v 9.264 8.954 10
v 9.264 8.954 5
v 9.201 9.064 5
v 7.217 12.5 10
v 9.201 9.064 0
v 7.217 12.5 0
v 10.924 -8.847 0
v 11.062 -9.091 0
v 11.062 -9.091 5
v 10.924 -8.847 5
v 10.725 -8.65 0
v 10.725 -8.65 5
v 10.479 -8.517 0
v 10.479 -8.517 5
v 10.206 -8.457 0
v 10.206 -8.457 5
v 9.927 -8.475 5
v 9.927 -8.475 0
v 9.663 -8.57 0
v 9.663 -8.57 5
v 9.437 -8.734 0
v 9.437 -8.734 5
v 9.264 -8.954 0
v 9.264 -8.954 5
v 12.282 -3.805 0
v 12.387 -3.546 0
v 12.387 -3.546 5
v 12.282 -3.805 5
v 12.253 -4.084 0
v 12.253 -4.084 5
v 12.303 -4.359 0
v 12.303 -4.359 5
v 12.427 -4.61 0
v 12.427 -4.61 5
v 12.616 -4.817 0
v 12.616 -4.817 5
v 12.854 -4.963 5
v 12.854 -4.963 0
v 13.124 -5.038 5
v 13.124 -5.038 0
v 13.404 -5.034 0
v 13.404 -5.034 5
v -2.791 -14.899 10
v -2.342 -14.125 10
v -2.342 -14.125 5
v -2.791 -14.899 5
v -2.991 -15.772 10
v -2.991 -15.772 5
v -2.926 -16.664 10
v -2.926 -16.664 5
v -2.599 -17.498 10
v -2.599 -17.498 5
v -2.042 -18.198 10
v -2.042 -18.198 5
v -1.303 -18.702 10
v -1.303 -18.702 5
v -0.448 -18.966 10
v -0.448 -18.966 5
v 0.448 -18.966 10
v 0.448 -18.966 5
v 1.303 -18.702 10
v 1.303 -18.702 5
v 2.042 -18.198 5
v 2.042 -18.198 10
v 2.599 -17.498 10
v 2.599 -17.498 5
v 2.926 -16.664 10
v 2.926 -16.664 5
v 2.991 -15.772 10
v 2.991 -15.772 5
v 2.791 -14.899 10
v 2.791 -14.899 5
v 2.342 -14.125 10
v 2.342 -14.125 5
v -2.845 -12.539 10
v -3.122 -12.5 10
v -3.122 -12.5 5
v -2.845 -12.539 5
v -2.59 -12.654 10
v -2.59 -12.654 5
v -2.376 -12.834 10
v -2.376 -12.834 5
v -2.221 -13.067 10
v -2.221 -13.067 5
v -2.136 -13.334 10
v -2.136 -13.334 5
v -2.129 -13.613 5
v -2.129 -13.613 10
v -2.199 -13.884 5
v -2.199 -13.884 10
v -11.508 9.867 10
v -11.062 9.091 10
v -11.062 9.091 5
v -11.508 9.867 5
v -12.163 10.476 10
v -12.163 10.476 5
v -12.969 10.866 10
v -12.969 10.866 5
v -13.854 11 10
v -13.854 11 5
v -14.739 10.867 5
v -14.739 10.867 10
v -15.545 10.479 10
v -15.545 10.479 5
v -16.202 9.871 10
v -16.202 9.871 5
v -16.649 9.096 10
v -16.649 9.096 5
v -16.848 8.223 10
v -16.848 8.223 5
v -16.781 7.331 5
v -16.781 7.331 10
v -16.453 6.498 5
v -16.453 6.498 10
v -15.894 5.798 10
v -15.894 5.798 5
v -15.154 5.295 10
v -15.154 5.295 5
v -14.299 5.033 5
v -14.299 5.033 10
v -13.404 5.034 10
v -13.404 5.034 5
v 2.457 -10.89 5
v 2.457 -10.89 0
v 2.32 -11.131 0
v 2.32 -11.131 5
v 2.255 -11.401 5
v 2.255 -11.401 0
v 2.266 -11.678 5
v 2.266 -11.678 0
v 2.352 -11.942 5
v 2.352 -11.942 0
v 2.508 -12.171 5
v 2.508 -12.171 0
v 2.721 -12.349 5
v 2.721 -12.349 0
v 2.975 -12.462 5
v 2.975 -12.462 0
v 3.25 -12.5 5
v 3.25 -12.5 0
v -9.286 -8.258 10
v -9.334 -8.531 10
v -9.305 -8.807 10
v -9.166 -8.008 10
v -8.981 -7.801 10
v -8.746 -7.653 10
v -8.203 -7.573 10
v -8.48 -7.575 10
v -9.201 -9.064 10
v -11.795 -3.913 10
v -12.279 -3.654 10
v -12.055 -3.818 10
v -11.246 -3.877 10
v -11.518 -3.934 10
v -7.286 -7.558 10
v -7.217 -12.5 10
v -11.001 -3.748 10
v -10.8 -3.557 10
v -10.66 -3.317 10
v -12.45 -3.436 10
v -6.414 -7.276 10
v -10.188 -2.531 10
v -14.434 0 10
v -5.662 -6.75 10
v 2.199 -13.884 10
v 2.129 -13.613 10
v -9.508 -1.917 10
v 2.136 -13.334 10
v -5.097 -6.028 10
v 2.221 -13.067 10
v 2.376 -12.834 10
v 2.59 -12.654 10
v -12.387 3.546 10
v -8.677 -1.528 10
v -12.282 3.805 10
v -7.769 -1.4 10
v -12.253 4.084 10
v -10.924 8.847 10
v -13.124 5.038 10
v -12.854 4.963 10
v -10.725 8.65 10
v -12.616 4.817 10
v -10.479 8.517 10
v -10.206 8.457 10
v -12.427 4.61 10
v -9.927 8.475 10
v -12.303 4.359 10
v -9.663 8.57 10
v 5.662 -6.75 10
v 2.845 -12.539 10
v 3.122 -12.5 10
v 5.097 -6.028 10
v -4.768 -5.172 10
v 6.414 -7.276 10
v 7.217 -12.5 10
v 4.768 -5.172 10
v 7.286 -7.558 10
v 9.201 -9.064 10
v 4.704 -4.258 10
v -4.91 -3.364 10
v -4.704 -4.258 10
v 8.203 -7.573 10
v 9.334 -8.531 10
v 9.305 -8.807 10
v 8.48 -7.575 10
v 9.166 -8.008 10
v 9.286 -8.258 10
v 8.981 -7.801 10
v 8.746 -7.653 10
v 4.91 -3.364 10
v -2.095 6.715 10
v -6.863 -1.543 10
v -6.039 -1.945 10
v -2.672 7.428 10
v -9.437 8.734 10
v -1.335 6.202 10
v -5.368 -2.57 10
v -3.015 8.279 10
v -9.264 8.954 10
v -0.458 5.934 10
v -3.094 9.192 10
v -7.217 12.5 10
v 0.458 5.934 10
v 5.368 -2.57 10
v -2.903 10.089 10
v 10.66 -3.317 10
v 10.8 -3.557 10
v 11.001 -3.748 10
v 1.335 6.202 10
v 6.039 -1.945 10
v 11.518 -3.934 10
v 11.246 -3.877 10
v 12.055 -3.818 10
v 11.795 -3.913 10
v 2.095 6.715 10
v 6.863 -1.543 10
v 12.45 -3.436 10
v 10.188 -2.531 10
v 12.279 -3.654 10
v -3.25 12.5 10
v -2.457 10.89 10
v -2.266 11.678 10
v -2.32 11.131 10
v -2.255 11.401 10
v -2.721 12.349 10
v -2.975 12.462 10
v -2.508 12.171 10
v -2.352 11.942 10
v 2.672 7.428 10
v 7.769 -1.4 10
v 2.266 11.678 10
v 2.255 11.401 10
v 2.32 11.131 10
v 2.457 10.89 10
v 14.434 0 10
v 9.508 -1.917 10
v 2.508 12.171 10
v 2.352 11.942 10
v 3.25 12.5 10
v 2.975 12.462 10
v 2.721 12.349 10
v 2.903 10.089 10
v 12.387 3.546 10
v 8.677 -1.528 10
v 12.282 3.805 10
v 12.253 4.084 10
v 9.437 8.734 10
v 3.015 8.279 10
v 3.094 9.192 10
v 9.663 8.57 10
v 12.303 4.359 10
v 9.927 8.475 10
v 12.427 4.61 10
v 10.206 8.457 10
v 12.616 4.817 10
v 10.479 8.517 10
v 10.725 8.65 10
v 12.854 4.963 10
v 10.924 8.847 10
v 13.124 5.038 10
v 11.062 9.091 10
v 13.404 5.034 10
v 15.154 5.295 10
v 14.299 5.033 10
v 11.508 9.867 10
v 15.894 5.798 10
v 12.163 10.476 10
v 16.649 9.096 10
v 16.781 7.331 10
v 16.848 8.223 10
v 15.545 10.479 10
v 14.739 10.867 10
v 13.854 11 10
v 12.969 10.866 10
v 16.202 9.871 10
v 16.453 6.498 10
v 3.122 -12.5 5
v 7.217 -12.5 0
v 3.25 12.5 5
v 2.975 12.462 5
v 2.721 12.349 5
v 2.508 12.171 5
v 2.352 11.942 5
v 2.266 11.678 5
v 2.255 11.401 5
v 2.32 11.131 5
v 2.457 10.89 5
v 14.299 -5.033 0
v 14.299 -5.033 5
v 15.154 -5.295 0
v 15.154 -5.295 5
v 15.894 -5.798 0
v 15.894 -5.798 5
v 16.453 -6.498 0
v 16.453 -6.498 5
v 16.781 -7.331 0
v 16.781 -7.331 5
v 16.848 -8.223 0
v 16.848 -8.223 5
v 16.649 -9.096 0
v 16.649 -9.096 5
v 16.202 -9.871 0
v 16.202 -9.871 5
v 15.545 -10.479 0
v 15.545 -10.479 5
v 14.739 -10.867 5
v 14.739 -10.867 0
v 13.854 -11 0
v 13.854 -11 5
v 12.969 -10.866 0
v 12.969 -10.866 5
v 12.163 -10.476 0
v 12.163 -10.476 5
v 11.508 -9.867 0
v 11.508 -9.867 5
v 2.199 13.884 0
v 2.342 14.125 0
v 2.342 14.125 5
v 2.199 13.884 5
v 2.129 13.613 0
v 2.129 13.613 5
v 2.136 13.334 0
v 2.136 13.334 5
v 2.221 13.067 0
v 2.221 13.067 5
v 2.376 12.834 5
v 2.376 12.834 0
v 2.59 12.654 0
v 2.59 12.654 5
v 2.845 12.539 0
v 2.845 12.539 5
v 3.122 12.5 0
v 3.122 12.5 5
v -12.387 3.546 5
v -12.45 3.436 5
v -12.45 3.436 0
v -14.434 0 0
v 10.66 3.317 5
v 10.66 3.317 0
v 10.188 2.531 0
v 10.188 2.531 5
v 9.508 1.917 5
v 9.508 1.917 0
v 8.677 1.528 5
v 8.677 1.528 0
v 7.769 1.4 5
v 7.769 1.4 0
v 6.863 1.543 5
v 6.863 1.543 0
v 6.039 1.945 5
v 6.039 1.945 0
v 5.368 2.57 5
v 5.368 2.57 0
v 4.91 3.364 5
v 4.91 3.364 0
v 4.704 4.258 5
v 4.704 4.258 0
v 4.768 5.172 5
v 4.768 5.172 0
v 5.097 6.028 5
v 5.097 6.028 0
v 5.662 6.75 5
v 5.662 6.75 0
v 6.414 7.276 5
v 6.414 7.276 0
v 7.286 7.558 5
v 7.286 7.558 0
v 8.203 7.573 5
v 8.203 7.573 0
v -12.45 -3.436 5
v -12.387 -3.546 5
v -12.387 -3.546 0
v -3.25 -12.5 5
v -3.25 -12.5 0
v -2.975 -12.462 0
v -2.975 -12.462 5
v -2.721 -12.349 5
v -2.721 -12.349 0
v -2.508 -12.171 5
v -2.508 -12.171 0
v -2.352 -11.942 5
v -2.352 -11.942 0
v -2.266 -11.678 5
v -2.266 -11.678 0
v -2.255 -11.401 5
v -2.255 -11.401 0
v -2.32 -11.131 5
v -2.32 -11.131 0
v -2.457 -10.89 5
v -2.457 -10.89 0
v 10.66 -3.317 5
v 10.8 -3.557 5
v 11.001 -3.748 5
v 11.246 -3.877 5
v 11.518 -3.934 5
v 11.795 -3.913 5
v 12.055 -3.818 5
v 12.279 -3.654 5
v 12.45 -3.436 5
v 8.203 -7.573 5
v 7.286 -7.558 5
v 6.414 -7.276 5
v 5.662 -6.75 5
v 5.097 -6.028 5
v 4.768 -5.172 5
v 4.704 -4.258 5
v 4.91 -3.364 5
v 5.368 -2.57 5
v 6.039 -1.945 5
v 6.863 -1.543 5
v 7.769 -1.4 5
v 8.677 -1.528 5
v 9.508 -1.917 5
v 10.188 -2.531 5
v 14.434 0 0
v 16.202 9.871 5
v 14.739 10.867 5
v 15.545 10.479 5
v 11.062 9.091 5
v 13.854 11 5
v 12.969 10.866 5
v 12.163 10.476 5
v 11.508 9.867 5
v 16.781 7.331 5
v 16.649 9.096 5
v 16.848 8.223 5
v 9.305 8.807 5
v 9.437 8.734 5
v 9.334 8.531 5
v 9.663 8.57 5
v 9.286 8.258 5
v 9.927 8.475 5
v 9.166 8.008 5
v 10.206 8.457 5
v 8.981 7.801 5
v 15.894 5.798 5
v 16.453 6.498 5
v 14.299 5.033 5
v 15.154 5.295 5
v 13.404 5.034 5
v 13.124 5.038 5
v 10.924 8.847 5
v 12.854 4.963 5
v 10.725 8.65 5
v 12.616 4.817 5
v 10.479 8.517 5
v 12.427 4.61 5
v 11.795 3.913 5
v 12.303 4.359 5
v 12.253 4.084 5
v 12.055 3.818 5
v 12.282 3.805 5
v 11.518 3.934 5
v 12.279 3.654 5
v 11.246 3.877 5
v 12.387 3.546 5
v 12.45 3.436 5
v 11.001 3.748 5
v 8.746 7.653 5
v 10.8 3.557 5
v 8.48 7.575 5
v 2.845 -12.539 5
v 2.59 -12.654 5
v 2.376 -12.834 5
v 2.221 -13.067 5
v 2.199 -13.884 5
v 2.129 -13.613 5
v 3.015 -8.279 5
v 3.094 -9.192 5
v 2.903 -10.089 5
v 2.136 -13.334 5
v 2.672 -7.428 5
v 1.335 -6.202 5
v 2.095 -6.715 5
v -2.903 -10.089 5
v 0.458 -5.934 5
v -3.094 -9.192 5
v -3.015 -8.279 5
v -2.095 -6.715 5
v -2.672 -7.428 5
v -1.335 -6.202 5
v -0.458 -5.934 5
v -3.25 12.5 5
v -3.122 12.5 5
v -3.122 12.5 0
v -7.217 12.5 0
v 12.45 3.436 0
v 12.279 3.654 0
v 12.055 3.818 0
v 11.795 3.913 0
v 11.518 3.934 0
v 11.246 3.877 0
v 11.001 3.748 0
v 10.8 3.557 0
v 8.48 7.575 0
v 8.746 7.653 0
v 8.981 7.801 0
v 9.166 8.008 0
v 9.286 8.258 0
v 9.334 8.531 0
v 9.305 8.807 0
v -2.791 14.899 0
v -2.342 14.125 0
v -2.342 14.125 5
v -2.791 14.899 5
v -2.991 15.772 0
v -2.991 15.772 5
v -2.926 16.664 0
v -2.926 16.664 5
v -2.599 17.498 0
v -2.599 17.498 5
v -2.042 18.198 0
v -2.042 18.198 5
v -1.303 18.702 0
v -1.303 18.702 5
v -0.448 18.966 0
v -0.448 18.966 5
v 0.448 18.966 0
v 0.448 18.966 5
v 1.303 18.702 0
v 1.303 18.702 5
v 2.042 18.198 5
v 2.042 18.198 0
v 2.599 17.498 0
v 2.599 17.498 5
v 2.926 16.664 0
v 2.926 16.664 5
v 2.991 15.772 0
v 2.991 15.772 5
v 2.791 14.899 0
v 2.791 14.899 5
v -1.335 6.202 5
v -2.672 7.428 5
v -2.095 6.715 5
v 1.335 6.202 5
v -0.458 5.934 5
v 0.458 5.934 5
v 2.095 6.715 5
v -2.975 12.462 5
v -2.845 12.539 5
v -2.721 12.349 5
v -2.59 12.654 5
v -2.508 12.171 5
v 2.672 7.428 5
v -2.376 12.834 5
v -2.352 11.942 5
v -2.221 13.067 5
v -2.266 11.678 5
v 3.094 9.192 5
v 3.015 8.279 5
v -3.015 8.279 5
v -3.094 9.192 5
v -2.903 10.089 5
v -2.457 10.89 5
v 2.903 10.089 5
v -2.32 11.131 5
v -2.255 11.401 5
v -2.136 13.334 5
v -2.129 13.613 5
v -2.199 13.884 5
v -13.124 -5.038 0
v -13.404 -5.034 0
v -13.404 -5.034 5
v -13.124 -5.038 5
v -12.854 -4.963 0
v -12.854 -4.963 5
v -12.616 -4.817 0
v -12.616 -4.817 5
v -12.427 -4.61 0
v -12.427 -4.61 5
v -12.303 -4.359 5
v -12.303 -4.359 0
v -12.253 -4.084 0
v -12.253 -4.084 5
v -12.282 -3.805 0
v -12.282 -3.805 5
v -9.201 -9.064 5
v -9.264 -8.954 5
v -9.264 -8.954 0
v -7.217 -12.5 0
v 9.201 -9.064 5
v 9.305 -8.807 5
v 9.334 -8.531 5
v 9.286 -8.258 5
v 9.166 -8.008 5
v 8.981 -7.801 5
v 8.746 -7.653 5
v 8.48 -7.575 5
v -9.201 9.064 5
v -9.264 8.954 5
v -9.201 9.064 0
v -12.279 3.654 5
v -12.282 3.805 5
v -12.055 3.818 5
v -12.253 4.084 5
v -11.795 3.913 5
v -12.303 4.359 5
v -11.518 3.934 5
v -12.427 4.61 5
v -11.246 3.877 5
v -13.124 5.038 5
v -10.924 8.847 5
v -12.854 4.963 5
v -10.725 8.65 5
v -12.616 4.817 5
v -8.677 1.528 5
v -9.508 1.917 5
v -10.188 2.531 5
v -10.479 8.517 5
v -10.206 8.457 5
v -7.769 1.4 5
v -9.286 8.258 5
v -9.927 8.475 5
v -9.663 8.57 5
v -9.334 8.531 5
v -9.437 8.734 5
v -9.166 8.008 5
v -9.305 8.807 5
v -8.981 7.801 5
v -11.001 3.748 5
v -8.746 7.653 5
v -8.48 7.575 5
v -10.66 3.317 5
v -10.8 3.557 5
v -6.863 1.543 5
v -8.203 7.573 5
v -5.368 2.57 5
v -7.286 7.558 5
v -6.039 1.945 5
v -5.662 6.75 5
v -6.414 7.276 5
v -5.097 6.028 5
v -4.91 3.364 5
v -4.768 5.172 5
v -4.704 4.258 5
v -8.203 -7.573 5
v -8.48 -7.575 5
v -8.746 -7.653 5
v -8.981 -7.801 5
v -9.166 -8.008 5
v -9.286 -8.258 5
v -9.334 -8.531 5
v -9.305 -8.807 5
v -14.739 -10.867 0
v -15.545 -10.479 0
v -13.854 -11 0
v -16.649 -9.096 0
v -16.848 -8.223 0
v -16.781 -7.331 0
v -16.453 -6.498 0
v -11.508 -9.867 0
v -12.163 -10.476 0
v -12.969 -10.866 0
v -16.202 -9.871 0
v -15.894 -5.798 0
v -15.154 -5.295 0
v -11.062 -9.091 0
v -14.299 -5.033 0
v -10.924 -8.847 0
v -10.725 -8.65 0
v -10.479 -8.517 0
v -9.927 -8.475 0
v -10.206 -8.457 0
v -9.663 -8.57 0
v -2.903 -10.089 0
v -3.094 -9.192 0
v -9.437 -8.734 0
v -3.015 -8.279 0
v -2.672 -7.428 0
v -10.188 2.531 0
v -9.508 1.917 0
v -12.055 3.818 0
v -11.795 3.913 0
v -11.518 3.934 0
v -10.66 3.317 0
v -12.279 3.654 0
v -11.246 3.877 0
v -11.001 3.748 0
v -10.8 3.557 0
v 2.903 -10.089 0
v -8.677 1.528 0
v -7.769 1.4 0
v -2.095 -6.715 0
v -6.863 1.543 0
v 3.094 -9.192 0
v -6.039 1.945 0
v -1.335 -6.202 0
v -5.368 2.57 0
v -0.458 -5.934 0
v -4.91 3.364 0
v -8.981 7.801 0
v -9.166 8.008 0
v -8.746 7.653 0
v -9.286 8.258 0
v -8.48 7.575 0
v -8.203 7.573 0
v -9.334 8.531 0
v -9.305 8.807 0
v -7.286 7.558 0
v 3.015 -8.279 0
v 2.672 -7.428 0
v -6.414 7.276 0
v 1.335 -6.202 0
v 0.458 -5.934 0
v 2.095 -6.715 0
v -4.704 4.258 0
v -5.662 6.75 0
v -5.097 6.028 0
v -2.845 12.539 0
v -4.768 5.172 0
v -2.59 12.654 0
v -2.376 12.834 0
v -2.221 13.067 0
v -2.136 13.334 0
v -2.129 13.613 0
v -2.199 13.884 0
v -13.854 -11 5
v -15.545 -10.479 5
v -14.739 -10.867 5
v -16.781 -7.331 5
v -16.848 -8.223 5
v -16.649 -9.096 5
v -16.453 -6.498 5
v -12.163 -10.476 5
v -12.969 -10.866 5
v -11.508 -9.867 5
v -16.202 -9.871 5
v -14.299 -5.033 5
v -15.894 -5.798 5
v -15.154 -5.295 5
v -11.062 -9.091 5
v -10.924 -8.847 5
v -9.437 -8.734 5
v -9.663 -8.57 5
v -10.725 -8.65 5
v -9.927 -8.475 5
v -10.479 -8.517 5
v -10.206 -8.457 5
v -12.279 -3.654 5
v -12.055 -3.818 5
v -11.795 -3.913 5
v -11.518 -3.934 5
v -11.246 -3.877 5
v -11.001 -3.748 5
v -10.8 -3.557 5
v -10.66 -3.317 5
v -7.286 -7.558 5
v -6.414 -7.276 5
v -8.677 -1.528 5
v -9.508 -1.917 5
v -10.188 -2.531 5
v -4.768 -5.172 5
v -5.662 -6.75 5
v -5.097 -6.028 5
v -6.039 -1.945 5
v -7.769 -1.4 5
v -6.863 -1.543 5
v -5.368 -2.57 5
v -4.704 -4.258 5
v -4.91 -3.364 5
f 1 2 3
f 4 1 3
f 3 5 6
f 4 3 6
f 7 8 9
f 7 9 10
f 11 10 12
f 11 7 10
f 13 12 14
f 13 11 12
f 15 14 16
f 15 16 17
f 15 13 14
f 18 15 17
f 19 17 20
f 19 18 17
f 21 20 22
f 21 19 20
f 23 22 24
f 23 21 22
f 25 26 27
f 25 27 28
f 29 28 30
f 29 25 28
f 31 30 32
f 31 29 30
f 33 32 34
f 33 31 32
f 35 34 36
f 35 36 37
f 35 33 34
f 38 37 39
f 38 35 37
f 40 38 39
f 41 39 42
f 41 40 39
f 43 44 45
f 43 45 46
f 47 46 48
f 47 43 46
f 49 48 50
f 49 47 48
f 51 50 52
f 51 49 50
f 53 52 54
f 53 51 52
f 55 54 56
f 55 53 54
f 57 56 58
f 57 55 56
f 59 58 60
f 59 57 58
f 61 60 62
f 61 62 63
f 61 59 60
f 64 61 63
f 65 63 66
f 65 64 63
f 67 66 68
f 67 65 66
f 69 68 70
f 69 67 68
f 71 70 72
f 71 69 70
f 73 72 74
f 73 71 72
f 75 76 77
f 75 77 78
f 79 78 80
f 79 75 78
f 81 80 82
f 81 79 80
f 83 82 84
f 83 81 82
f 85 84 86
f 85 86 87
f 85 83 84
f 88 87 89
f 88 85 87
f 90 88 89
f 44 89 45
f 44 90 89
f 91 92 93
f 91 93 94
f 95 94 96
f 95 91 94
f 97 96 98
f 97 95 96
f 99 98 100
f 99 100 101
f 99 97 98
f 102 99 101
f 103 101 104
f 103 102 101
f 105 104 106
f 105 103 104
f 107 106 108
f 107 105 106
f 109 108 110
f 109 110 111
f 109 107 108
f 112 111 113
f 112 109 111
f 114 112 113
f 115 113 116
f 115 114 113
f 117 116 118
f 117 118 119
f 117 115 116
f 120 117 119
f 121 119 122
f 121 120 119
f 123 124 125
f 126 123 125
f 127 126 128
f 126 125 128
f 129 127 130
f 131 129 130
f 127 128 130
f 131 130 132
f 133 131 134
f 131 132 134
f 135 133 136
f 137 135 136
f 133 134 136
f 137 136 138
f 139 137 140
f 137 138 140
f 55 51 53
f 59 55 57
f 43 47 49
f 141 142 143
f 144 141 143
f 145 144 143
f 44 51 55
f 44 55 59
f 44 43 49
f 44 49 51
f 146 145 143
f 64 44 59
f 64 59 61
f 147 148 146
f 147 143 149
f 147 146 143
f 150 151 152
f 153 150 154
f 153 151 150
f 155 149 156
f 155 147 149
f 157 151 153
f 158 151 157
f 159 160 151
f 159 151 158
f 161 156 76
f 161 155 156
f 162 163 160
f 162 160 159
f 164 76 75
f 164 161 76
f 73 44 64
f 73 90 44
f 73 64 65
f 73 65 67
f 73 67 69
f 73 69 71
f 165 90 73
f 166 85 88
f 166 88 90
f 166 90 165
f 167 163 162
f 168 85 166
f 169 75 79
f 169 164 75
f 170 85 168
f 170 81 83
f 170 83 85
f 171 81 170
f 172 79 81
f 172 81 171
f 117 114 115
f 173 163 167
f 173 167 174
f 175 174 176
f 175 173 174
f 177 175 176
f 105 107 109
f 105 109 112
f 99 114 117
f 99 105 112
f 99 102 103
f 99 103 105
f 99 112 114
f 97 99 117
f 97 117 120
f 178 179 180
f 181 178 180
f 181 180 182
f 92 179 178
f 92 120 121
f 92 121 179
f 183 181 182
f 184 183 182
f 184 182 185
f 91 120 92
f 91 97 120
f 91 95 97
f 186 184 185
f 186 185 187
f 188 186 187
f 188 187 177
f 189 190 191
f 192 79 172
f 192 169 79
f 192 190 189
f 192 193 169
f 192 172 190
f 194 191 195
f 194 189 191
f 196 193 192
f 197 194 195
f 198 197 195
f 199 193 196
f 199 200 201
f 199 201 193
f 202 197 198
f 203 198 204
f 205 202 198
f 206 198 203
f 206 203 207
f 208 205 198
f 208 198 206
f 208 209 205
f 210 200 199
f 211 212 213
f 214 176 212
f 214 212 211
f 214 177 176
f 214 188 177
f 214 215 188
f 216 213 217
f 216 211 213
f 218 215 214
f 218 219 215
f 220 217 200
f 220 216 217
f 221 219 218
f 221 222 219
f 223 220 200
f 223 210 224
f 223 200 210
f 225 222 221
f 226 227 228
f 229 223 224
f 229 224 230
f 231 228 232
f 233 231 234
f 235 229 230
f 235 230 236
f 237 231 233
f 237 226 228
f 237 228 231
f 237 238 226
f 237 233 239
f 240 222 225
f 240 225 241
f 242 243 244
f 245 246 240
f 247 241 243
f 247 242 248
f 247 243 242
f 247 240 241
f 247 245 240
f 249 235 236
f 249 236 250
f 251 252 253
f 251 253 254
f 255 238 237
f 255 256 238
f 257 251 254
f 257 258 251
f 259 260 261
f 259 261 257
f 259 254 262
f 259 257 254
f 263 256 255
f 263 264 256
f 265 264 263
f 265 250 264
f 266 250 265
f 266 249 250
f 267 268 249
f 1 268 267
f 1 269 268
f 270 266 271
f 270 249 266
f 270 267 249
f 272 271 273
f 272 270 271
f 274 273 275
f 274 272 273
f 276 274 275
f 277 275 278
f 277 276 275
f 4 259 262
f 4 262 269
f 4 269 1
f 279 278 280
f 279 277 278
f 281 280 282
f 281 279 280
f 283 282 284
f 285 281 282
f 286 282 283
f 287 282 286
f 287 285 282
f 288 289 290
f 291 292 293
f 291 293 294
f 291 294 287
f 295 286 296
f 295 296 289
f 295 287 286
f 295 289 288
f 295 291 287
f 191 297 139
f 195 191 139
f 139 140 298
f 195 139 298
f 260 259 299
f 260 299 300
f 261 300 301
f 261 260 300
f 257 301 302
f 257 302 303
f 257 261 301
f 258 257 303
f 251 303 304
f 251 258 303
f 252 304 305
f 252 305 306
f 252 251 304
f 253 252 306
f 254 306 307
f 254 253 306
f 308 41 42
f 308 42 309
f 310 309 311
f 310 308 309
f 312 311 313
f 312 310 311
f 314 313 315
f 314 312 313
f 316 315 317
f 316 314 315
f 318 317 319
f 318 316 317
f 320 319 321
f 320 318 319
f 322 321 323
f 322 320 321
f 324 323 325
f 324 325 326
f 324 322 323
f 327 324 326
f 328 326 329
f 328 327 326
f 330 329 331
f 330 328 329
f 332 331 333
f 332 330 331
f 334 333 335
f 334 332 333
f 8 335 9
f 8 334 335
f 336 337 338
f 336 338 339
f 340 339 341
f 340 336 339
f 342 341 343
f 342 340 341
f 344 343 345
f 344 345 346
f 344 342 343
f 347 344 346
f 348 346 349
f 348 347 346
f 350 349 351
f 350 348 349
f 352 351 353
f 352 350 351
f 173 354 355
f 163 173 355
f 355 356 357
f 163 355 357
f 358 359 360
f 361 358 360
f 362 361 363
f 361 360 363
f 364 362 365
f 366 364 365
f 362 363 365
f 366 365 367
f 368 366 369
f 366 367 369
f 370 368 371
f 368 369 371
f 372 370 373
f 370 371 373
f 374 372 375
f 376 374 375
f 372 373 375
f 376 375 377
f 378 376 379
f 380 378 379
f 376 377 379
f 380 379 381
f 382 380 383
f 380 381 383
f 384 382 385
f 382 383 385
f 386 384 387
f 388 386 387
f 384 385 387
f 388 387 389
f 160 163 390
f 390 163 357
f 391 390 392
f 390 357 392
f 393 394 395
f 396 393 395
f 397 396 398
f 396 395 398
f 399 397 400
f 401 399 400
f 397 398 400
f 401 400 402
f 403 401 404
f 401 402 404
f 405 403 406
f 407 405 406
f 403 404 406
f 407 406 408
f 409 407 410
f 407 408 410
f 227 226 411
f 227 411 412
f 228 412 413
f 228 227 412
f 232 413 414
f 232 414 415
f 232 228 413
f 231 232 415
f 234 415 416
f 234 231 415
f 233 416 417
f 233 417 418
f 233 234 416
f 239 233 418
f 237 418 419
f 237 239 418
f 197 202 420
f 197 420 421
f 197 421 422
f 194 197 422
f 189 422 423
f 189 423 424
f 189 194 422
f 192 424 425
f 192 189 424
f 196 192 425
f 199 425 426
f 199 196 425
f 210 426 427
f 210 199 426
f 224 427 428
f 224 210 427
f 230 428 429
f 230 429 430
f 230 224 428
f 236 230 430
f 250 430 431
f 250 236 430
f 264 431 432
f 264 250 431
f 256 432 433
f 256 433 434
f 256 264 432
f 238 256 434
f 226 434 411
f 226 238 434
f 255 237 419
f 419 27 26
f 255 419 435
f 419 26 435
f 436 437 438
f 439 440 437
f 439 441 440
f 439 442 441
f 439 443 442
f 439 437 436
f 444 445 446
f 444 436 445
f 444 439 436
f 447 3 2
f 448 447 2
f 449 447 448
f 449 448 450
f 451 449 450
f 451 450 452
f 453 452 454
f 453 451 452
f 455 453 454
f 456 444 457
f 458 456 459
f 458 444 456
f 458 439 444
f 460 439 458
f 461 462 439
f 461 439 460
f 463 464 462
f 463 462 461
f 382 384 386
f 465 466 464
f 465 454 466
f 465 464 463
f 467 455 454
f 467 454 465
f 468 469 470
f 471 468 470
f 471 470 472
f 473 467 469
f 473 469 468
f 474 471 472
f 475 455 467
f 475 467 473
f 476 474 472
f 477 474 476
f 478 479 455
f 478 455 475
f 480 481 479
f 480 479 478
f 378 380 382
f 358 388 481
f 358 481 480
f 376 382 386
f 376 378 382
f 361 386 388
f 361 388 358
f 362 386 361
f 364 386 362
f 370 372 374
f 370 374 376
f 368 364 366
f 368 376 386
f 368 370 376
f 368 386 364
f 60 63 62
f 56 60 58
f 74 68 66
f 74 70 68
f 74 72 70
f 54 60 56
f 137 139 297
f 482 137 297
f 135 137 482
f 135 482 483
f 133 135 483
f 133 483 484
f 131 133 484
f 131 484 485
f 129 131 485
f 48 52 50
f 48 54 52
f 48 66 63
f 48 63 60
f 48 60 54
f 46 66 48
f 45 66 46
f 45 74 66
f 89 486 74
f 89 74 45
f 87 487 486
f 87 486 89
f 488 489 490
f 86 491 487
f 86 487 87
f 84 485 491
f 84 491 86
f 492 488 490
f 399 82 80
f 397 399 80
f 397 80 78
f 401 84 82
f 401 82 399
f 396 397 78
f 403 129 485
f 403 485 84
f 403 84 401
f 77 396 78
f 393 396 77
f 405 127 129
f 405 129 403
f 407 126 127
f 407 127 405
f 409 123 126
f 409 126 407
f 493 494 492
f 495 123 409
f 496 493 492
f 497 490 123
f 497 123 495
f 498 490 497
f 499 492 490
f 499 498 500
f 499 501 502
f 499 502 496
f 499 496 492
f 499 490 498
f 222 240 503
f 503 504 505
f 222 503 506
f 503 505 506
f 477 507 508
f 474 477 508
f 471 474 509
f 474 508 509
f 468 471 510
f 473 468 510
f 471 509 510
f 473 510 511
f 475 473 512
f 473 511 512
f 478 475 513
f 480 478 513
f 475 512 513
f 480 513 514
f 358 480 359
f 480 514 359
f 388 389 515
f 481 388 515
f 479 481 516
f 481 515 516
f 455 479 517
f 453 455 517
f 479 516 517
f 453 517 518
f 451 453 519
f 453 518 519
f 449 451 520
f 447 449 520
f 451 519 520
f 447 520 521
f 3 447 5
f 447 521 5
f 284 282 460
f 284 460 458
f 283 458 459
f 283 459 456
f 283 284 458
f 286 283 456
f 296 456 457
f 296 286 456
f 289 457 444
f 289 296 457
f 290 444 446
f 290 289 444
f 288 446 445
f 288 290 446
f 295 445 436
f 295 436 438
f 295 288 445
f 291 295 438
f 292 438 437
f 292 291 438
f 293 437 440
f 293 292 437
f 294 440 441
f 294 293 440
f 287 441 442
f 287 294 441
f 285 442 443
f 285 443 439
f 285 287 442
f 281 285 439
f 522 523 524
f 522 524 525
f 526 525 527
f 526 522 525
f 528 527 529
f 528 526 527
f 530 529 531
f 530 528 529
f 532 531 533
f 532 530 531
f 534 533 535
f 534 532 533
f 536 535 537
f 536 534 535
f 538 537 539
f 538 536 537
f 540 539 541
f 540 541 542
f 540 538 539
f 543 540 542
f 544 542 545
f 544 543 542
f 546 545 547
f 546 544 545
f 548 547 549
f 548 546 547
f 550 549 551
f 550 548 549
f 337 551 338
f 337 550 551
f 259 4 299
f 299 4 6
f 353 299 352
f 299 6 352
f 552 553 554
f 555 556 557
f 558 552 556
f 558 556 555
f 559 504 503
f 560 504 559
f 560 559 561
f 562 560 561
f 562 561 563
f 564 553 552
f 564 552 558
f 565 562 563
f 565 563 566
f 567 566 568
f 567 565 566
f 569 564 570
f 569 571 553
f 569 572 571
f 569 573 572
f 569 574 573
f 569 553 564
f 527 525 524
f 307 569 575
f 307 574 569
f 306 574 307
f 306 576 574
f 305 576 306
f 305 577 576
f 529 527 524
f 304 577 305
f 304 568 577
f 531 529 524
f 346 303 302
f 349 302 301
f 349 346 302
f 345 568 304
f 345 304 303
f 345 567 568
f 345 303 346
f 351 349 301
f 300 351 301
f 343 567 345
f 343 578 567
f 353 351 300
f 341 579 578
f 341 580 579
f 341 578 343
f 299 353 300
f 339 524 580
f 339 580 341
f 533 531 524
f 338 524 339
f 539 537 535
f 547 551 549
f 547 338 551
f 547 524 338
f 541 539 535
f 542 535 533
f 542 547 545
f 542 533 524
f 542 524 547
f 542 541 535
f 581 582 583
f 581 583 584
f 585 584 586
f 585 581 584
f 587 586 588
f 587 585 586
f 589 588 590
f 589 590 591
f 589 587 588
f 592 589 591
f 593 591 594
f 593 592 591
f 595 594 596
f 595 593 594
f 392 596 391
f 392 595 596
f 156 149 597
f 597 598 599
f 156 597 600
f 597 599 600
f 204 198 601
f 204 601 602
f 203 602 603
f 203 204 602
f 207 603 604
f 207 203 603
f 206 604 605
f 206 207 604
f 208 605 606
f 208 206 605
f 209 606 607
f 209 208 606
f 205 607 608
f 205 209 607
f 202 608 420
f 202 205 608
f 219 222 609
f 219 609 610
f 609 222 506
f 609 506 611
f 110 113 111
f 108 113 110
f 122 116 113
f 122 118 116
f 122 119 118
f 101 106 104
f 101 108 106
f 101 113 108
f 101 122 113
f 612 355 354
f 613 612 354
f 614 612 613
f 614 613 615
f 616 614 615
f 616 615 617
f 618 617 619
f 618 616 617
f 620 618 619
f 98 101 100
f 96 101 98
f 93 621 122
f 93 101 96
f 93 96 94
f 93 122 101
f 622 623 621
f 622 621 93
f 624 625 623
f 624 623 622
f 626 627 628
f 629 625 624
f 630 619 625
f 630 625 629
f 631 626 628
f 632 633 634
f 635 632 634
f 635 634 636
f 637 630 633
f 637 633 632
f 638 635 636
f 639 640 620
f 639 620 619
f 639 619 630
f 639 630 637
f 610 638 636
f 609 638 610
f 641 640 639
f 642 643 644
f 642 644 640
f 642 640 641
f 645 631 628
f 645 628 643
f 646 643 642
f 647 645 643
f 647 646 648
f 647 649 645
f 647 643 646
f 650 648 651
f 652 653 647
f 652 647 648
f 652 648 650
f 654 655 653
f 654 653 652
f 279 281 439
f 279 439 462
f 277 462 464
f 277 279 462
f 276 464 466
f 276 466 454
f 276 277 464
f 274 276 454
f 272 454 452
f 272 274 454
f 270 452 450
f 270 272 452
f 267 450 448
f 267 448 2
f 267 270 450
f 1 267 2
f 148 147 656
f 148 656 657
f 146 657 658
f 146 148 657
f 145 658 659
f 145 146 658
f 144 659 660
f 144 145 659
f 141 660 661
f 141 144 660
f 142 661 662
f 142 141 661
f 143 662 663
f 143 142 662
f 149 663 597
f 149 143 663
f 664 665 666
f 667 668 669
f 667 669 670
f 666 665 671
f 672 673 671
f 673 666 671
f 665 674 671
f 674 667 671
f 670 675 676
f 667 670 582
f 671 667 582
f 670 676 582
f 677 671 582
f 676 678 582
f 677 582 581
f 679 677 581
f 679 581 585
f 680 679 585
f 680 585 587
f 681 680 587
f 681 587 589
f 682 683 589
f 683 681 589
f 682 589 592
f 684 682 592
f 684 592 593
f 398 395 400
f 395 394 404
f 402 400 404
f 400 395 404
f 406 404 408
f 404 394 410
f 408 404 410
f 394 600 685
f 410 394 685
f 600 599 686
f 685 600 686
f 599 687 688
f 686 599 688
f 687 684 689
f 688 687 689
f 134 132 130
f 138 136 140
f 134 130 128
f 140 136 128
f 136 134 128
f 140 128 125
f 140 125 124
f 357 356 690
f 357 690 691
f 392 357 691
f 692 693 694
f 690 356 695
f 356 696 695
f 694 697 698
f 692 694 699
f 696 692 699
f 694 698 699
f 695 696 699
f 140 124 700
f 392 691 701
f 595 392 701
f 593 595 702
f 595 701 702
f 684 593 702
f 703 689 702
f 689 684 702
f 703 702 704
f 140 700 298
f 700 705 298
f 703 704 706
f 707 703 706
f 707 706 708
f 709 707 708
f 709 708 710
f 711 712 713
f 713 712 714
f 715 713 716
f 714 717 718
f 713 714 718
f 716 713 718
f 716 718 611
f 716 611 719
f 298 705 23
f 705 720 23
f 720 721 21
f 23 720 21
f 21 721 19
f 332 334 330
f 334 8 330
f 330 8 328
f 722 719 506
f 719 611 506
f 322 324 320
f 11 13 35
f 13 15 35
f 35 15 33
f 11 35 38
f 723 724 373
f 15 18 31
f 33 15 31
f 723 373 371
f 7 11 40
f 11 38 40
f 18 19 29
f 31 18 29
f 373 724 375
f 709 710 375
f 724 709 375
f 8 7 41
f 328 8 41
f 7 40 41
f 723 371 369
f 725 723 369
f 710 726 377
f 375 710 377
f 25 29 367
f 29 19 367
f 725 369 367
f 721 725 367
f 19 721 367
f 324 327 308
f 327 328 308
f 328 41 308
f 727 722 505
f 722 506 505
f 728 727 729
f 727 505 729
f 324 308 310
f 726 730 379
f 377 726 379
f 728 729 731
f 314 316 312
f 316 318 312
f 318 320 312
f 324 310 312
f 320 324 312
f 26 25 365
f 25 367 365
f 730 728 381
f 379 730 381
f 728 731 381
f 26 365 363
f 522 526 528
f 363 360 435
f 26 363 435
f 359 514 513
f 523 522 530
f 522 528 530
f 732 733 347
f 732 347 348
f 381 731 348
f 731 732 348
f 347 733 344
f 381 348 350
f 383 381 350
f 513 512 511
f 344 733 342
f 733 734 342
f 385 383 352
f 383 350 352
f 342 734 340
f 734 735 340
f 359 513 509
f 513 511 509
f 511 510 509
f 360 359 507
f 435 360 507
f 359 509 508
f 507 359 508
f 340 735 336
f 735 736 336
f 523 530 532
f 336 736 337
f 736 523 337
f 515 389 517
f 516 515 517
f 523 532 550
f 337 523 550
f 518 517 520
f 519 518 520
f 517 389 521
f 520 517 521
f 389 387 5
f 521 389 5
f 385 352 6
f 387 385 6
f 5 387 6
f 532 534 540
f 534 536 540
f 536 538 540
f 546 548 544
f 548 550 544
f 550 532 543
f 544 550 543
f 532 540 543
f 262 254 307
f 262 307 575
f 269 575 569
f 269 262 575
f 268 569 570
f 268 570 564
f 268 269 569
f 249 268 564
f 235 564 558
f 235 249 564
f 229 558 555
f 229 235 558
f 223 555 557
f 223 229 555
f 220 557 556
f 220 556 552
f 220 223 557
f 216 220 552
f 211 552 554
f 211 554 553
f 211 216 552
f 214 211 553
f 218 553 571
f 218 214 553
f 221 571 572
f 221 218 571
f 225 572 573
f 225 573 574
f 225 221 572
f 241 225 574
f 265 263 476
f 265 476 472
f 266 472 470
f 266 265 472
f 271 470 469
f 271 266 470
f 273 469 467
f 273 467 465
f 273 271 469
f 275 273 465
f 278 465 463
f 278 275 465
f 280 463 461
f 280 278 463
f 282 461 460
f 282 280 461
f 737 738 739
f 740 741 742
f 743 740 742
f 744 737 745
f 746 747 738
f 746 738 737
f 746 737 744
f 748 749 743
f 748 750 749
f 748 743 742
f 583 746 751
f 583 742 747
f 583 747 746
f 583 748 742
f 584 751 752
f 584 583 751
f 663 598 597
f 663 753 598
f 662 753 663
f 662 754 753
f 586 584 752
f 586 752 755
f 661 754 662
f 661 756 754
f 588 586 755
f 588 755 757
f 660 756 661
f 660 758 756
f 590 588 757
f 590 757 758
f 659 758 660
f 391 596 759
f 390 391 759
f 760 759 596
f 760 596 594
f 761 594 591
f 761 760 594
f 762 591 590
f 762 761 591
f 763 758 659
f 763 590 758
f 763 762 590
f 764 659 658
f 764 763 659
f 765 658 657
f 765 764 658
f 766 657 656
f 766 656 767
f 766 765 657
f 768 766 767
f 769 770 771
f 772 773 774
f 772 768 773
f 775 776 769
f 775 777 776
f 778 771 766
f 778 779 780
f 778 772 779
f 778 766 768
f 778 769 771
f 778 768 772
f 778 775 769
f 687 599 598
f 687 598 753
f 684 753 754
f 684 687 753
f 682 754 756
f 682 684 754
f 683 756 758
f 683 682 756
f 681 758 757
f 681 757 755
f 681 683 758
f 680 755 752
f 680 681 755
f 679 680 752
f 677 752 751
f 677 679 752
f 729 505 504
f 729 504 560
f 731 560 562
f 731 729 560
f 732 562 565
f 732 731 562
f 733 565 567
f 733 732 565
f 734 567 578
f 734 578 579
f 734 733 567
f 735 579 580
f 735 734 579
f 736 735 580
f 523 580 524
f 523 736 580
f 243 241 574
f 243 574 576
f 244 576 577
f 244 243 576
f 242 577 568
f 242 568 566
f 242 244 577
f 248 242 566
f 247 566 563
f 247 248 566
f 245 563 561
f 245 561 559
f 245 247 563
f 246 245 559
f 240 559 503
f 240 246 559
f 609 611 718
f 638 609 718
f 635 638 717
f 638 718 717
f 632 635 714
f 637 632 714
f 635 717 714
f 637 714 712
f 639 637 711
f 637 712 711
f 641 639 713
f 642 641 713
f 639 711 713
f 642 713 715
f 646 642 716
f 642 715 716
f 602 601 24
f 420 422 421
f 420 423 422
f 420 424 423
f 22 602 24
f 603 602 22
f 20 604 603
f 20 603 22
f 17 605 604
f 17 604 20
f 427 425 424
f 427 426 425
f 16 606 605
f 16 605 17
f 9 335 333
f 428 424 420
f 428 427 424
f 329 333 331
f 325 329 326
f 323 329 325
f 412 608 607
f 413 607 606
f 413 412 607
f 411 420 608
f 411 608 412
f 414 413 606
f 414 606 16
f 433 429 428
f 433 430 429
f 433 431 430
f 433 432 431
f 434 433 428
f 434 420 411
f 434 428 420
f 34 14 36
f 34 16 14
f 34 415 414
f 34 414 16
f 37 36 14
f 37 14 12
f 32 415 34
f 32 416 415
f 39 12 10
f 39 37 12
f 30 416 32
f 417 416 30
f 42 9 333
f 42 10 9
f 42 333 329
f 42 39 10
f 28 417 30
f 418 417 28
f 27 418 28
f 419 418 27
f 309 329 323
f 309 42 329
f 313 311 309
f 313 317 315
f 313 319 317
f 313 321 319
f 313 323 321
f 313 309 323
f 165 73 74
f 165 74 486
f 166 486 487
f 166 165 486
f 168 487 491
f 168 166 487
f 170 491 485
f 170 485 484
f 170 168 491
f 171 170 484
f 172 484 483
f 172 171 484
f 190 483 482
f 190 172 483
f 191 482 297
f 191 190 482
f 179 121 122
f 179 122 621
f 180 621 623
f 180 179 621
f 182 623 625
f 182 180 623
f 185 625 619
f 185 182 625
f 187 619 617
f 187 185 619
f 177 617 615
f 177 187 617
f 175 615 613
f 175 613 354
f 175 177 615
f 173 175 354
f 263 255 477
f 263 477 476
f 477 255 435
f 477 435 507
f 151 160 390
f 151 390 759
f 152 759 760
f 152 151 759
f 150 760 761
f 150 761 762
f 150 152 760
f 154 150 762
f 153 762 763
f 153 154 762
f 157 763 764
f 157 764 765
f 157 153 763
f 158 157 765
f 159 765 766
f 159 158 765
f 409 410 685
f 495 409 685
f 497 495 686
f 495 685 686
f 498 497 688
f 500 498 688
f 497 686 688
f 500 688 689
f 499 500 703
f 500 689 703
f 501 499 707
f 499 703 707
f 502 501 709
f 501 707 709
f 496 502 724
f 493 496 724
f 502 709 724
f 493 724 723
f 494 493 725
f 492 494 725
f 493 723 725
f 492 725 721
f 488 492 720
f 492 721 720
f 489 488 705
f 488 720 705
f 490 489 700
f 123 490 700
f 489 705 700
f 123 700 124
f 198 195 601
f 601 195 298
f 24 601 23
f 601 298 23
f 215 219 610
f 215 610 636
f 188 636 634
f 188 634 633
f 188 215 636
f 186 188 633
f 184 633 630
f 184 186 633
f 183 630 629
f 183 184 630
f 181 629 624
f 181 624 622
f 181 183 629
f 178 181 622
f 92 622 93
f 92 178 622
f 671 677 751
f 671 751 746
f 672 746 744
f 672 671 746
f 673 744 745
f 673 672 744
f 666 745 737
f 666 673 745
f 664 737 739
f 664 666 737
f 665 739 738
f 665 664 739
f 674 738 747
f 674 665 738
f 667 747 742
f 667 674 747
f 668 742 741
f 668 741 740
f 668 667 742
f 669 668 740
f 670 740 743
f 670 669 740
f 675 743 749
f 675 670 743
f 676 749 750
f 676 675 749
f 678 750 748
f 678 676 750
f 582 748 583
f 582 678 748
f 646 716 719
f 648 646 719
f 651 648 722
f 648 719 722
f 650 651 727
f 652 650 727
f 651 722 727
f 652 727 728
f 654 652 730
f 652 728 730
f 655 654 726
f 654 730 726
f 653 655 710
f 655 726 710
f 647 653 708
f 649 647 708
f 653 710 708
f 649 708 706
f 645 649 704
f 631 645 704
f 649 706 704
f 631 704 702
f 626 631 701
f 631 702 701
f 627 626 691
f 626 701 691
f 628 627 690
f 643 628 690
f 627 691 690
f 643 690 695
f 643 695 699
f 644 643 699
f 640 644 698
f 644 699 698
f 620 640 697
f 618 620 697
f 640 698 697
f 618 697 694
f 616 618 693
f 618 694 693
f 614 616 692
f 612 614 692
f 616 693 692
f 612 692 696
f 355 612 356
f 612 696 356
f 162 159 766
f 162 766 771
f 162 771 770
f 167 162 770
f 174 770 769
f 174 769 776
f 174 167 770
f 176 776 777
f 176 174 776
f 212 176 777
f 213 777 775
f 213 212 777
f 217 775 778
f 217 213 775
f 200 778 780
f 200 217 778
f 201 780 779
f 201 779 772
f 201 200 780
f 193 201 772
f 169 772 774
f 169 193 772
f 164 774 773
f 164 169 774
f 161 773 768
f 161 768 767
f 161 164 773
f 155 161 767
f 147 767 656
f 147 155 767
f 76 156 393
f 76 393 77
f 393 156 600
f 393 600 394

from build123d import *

# Parameters (mm, degrees)
EXTRUDE_1_DEPTH          = 10
EXTRUDE_2_DEPTH          = 5
CUT_EXTRUDE_2_DEPTH      = 5
PATTERN_CIRCULAR_1_COUNT = 3
EXTRUDE_3_DEPTH          = 5
CUT_EXTRUDE_3_DEPTH      = 5


with BuildPart() as part:
    # 草图1 → 凸台-拉伸1 (new body)
    with BuildSketch(Plane.XY):
        Polygon((14.43375673, 0), (7.216878365, 12.5), (-7.216878365, 12.5), (-14.43375673, 0), (-7.216878365, -12.5), (7.216878365, -12.5), align=None)
    extrude(amount=EXTRUDE_1_DEPTH)

    # 草图2 → 凸台-拉伸2 (add)
    with BuildSketch(Plane(origin=(0, 0, 0), x_dir=(-1, 0, 0), z_dir=(0, 0, -1))):
        with BuildLine():
            Line((-3.122498999, 12.5), (3.122498999, 12.5))
            ThreePointArc((3.122498999, 12.5), (2.22111118, 13.066987298), (2.341874249, 14.125))
            ThreePointArc((2.341874249, 14.125), (0, 19), (-2.341874249, 14.125))
            ThreePointArc((-2.341874249, 14.125), (-2.22111118, 13.066987298), (-3.122498999, 12.5))
        make_face()
    extrude_2 = extrude(amount=-EXTRUDE_2_DEPTH)

    # 草图3 → 切除-拉伸2 (cut)
    with BuildSketch(Plane(origin=(0, 0, 0), x_dir=(-1, 0, 0), z_dir=(0, 0, -1))):
        with BuildLine():
            ThreePointArc((-2.457026249, -10.890243902), (-2.352465403, -11.941726104), (-3.249615362, -12.5))
            Line((-3.249615362, -12.5), (0, -12.5))
            Line((0, -12.5), (3.249615362, -12.5))
            ThreePointArc((3.249615362, -12.5), (2.352465403, -11.941726104), (2.457026249, -10.890243902))
            ThreePointArc((2.457026249, -10.890243902), (0, -5.9), (-2.457026249, -10.890243902))
        make_face()
    cut_extrude_2 = extrude(amount=-CUT_EXTRUDE_2_DEPTH, mode=Mode.SUBTRACT)

    # 阵列(圆周)1: 凸台-拉伸2, 切除-拉伸2 ×3 about axis
    pattern_circular_1_axis = Axis((0, 0, 0), (0, 0, -1))
    add([extrude_2.rotate(pattern_circular_1_axis, i * 360 / PATTERN_CIRCULAR_1_COUNT) for i in range(1, PATTERN_CIRCULAR_1_COUNT)])
    add([cut_extrude_2.rotate(pattern_circular_1_axis, i * 360 / PATTERN_CIRCULAR_1_COUNT) for i in range(1, PATTERN_CIRCULAR_1_COUNT)], mode=Mode.SUBTRACT)

    # 草图5 → 凸台-拉伸3 (add)
    with BuildSketch(Plane.XY.offset(10)):
        with BuildLine():
            Line((7.216878365, -12.5), (9.200509866, -9.064249456))
            ThreePointArc((9.200509866, -9.064249456), (9.16560547, -8.008157853), (8.202714748, -7.572969101))
            ThreePointArc((8.202714748, -7.572969101), (5.109549882, -2.95), (10.659740998, -3.317274802))
            ThreePointArc((10.659740998, -3.317274802), (11.518070873, -3.933568252), (12.450125228, -3.435750544))
            Line((12.450125228, -3.435750544), (14.43375673, 0))
            Line((14.43375673, 0), (12.386567047, 3.545836543))
            ThreePointArc((12.386567047, 3.545836543), (12.426898541, 4.609954942), (13.403545953, 5.034377408))
            ThreePointArc((13.403545953, 5.034377408), (16.454482672, 9.5), (11.061671704, 9.090622592))
            ThreePointArc((11.061671704, 9.090622592), (10.205787361, 8.457032356), (9.264068048, 8.954163457))
            Line((9.264068048, 8.954163457), (7.216878365, 12.5))
            Line((7.216878365, 12.5), (3.249615362, 12.5))
            ThreePointArc((3.249615362, 12.5), (2.352465403, 11.941726104), (2.457026249, 10.890243902))
            ThreePointArc((2.457026249, 10.890243902), (0, 5.9), (-2.457026249, 10.890243902))
            ThreePointArc((-2.457026249, 10.890243902), (-2.352465403, 11.941726104), (-3.249615362, 12.5))
            Line((-3.249615362, 12.5), (-7.216878365, 12.5))
            Line((-7.216878365, 12.5), (-9.264068048, 8.954163457))
            ThreePointArc((-9.264068048, 8.954163457), (-10.205787361, 8.457032356), (-11.061671704, 9.090622592))
            ThreePointArc((-11.061671704, 9.090622592), (-16.454482672, 9.5), (-13.403545953, 5.034377408))
            ThreePointArc((-13.403545953, 5.034377408), (-12.426898541, 4.609954942), (-12.386567047, 3.545836543))
            Line((-12.386567047, 3.545836543), (-14.43375673, 0))
            Line((-14.43375673, 0), (-12.450125228, -3.435750544))
            ThreePointArc((-12.450125228, -3.435750544), (-11.518070873, -3.933568252), (-10.659740998, -3.317274802))
            ThreePointArc((-10.659740998, -3.317274802), (-5.109549882, -2.95), (-8.202714748, -7.572969101))
            ThreePointArc((-8.202714748, -7.572969101), (-9.16560547, -8.008157853), (-9.200509866, -9.064249456))
            Line((-9.200509866, -9.064249456), (-7.216878365, -12.5))
            Line((-7.216878365, -12.5), (-3.122498999, -12.5))
            ThreePointArc((-3.122498999, -12.5), (-2.22111118, -13.066987298), (-2.341874249, -14.125))
            ThreePointArc((-2.341874249, -14.125), (0, -19), (2.341874249, -14.125))
            ThreePointArc((2.341874249, -14.125), (2.22111118, -13.066987298), (3.122498999, -12.5))
            Line((3.122498999, -12.5), (7.216878365, -12.5))
        make_face()
    extrude(amount=-EXTRUDE_3_DEPTH)

    # 草图6 → 切除-拉伸3 (cut)
    with BuildSketch(Plane.XY.offset(10)):
        Polygon((26.179583505, 0.365011735), (12.773682317, 22.854690243), (-13.405901188, 22.489678508), (-26.179583505, -0.365011735), (-12.773682317, -22.854690243), (13.405901188, -22.489678508), align=None)
        with BuildLine():
            Line((7.216878365, -12.5), (9.200509866, -9.064249456))
            ThreePointArc((9.200509866, -9.064249456), (9.16560547, -8.008157853), (8.202714748, -7.572969101))
            ThreePointArc((8.202714748, -7.572969101), (5.109549882, -2.95), (10.659740998, -3.317274802))
            ThreePointArc((10.659740998, -3.317274802), (11.518070873, -3.933568252), (12.450125228, -3.435750544))
            Line((12.450125228, -3.435750544), (14.43375673, 0))
            Line((14.43375673, 0), (12.386567047, 3.545836543))
            ThreePointArc((12.386567047, 3.545836543), (12.426898541, 4.609954942), (13.403545953, 5.034377408))
            ThreePointArc((13.403545953, 5.034377408), (16.454482672, 9.5), (11.061671704, 9.090622592))
            ThreePointArc((11.061671704, 9.090622592), (10.205787361, 8.457032356), (9.264068048, 8.954163457))
            Line((9.264068048, 8.954163457), (7.216878365, 12.5))
            Line((7.216878365, 12.5), (3.249615362, 12.5))
            ThreePointArc((3.249615362, 12.5), (2.352465403, 11.941726104), (2.457026249, 10.890243902))
            ThreePointArc((2.457026249, 10.890243902), (0, 5.9), (-2.457026249, 10.890243902))
            ThreePointArc((-2.457026249, 10.890243902), (-2.352465403, 11.941726104), (-3.249615362, 12.5))
            Line((-3.249615362, 12.5), (-7.216878365, 12.5))
            Line((-7.216878365, 12.5), (-9.264068048, 8.954163457))
            ThreePointArc((-9.264068048, 8.954163457), (-10.205787361, 8.457032356), (-11.061671704, 9.090622592))
            ThreePointArc((-11.061671704, 9.090622592), (-16.454482672, 9.5), (-13.403545953, 5.034377408))
            ThreePointArc((-13.403545953, 5.034377408), (-12.426898541, 4.609954942), (-12.386567047, 3.545836543))
            Line((-12.386567047, 3.545836543), (-14.43375673, 0))
            Line((-14.43375673, 0), (-12.450125228, -3.435750544))
            ThreePointArc((-12.450125228, -3.435750544), (-11.518070873, -3.933568252), (-10.659740998, -3.317274802))
            ThreePointArc((-10.659740998, -3.317274802), (-5.109549882, -2.95), (-8.202714748, -7.572969101))
            ThreePointArc((-8.202714748, -7.572969101), (-9.16560547, -8.008157853), (-9.200509866, -9.064249456))
            Line((-9.200509866, -9.064249456), (-7.216878365, -12.5))
            Line((-7.216878365, -12.5), (-3.122498999, -12.5))
            ThreePointArc((-3.122498999, -12.5), (-2.22111118, -13.066987298), (-2.341874249, -14.125))
            ThreePointArc((-2.341874249, -14.125), (0, -19), (2.341874249, -14.125))
            ThreePointArc((2.341874249, -14.125), (2.22111118, -13.066987298), (3.122498999, -12.5))
            Line((3.122498999, -12.5), (7.216878365, -12.5))
        make_face(mode=Mode.SUBTRACT)
    extrude(amount=-CUT_EXTRUDE_3_DEPTH, mode=Mode.SUBTRACT)


solid = part.part
